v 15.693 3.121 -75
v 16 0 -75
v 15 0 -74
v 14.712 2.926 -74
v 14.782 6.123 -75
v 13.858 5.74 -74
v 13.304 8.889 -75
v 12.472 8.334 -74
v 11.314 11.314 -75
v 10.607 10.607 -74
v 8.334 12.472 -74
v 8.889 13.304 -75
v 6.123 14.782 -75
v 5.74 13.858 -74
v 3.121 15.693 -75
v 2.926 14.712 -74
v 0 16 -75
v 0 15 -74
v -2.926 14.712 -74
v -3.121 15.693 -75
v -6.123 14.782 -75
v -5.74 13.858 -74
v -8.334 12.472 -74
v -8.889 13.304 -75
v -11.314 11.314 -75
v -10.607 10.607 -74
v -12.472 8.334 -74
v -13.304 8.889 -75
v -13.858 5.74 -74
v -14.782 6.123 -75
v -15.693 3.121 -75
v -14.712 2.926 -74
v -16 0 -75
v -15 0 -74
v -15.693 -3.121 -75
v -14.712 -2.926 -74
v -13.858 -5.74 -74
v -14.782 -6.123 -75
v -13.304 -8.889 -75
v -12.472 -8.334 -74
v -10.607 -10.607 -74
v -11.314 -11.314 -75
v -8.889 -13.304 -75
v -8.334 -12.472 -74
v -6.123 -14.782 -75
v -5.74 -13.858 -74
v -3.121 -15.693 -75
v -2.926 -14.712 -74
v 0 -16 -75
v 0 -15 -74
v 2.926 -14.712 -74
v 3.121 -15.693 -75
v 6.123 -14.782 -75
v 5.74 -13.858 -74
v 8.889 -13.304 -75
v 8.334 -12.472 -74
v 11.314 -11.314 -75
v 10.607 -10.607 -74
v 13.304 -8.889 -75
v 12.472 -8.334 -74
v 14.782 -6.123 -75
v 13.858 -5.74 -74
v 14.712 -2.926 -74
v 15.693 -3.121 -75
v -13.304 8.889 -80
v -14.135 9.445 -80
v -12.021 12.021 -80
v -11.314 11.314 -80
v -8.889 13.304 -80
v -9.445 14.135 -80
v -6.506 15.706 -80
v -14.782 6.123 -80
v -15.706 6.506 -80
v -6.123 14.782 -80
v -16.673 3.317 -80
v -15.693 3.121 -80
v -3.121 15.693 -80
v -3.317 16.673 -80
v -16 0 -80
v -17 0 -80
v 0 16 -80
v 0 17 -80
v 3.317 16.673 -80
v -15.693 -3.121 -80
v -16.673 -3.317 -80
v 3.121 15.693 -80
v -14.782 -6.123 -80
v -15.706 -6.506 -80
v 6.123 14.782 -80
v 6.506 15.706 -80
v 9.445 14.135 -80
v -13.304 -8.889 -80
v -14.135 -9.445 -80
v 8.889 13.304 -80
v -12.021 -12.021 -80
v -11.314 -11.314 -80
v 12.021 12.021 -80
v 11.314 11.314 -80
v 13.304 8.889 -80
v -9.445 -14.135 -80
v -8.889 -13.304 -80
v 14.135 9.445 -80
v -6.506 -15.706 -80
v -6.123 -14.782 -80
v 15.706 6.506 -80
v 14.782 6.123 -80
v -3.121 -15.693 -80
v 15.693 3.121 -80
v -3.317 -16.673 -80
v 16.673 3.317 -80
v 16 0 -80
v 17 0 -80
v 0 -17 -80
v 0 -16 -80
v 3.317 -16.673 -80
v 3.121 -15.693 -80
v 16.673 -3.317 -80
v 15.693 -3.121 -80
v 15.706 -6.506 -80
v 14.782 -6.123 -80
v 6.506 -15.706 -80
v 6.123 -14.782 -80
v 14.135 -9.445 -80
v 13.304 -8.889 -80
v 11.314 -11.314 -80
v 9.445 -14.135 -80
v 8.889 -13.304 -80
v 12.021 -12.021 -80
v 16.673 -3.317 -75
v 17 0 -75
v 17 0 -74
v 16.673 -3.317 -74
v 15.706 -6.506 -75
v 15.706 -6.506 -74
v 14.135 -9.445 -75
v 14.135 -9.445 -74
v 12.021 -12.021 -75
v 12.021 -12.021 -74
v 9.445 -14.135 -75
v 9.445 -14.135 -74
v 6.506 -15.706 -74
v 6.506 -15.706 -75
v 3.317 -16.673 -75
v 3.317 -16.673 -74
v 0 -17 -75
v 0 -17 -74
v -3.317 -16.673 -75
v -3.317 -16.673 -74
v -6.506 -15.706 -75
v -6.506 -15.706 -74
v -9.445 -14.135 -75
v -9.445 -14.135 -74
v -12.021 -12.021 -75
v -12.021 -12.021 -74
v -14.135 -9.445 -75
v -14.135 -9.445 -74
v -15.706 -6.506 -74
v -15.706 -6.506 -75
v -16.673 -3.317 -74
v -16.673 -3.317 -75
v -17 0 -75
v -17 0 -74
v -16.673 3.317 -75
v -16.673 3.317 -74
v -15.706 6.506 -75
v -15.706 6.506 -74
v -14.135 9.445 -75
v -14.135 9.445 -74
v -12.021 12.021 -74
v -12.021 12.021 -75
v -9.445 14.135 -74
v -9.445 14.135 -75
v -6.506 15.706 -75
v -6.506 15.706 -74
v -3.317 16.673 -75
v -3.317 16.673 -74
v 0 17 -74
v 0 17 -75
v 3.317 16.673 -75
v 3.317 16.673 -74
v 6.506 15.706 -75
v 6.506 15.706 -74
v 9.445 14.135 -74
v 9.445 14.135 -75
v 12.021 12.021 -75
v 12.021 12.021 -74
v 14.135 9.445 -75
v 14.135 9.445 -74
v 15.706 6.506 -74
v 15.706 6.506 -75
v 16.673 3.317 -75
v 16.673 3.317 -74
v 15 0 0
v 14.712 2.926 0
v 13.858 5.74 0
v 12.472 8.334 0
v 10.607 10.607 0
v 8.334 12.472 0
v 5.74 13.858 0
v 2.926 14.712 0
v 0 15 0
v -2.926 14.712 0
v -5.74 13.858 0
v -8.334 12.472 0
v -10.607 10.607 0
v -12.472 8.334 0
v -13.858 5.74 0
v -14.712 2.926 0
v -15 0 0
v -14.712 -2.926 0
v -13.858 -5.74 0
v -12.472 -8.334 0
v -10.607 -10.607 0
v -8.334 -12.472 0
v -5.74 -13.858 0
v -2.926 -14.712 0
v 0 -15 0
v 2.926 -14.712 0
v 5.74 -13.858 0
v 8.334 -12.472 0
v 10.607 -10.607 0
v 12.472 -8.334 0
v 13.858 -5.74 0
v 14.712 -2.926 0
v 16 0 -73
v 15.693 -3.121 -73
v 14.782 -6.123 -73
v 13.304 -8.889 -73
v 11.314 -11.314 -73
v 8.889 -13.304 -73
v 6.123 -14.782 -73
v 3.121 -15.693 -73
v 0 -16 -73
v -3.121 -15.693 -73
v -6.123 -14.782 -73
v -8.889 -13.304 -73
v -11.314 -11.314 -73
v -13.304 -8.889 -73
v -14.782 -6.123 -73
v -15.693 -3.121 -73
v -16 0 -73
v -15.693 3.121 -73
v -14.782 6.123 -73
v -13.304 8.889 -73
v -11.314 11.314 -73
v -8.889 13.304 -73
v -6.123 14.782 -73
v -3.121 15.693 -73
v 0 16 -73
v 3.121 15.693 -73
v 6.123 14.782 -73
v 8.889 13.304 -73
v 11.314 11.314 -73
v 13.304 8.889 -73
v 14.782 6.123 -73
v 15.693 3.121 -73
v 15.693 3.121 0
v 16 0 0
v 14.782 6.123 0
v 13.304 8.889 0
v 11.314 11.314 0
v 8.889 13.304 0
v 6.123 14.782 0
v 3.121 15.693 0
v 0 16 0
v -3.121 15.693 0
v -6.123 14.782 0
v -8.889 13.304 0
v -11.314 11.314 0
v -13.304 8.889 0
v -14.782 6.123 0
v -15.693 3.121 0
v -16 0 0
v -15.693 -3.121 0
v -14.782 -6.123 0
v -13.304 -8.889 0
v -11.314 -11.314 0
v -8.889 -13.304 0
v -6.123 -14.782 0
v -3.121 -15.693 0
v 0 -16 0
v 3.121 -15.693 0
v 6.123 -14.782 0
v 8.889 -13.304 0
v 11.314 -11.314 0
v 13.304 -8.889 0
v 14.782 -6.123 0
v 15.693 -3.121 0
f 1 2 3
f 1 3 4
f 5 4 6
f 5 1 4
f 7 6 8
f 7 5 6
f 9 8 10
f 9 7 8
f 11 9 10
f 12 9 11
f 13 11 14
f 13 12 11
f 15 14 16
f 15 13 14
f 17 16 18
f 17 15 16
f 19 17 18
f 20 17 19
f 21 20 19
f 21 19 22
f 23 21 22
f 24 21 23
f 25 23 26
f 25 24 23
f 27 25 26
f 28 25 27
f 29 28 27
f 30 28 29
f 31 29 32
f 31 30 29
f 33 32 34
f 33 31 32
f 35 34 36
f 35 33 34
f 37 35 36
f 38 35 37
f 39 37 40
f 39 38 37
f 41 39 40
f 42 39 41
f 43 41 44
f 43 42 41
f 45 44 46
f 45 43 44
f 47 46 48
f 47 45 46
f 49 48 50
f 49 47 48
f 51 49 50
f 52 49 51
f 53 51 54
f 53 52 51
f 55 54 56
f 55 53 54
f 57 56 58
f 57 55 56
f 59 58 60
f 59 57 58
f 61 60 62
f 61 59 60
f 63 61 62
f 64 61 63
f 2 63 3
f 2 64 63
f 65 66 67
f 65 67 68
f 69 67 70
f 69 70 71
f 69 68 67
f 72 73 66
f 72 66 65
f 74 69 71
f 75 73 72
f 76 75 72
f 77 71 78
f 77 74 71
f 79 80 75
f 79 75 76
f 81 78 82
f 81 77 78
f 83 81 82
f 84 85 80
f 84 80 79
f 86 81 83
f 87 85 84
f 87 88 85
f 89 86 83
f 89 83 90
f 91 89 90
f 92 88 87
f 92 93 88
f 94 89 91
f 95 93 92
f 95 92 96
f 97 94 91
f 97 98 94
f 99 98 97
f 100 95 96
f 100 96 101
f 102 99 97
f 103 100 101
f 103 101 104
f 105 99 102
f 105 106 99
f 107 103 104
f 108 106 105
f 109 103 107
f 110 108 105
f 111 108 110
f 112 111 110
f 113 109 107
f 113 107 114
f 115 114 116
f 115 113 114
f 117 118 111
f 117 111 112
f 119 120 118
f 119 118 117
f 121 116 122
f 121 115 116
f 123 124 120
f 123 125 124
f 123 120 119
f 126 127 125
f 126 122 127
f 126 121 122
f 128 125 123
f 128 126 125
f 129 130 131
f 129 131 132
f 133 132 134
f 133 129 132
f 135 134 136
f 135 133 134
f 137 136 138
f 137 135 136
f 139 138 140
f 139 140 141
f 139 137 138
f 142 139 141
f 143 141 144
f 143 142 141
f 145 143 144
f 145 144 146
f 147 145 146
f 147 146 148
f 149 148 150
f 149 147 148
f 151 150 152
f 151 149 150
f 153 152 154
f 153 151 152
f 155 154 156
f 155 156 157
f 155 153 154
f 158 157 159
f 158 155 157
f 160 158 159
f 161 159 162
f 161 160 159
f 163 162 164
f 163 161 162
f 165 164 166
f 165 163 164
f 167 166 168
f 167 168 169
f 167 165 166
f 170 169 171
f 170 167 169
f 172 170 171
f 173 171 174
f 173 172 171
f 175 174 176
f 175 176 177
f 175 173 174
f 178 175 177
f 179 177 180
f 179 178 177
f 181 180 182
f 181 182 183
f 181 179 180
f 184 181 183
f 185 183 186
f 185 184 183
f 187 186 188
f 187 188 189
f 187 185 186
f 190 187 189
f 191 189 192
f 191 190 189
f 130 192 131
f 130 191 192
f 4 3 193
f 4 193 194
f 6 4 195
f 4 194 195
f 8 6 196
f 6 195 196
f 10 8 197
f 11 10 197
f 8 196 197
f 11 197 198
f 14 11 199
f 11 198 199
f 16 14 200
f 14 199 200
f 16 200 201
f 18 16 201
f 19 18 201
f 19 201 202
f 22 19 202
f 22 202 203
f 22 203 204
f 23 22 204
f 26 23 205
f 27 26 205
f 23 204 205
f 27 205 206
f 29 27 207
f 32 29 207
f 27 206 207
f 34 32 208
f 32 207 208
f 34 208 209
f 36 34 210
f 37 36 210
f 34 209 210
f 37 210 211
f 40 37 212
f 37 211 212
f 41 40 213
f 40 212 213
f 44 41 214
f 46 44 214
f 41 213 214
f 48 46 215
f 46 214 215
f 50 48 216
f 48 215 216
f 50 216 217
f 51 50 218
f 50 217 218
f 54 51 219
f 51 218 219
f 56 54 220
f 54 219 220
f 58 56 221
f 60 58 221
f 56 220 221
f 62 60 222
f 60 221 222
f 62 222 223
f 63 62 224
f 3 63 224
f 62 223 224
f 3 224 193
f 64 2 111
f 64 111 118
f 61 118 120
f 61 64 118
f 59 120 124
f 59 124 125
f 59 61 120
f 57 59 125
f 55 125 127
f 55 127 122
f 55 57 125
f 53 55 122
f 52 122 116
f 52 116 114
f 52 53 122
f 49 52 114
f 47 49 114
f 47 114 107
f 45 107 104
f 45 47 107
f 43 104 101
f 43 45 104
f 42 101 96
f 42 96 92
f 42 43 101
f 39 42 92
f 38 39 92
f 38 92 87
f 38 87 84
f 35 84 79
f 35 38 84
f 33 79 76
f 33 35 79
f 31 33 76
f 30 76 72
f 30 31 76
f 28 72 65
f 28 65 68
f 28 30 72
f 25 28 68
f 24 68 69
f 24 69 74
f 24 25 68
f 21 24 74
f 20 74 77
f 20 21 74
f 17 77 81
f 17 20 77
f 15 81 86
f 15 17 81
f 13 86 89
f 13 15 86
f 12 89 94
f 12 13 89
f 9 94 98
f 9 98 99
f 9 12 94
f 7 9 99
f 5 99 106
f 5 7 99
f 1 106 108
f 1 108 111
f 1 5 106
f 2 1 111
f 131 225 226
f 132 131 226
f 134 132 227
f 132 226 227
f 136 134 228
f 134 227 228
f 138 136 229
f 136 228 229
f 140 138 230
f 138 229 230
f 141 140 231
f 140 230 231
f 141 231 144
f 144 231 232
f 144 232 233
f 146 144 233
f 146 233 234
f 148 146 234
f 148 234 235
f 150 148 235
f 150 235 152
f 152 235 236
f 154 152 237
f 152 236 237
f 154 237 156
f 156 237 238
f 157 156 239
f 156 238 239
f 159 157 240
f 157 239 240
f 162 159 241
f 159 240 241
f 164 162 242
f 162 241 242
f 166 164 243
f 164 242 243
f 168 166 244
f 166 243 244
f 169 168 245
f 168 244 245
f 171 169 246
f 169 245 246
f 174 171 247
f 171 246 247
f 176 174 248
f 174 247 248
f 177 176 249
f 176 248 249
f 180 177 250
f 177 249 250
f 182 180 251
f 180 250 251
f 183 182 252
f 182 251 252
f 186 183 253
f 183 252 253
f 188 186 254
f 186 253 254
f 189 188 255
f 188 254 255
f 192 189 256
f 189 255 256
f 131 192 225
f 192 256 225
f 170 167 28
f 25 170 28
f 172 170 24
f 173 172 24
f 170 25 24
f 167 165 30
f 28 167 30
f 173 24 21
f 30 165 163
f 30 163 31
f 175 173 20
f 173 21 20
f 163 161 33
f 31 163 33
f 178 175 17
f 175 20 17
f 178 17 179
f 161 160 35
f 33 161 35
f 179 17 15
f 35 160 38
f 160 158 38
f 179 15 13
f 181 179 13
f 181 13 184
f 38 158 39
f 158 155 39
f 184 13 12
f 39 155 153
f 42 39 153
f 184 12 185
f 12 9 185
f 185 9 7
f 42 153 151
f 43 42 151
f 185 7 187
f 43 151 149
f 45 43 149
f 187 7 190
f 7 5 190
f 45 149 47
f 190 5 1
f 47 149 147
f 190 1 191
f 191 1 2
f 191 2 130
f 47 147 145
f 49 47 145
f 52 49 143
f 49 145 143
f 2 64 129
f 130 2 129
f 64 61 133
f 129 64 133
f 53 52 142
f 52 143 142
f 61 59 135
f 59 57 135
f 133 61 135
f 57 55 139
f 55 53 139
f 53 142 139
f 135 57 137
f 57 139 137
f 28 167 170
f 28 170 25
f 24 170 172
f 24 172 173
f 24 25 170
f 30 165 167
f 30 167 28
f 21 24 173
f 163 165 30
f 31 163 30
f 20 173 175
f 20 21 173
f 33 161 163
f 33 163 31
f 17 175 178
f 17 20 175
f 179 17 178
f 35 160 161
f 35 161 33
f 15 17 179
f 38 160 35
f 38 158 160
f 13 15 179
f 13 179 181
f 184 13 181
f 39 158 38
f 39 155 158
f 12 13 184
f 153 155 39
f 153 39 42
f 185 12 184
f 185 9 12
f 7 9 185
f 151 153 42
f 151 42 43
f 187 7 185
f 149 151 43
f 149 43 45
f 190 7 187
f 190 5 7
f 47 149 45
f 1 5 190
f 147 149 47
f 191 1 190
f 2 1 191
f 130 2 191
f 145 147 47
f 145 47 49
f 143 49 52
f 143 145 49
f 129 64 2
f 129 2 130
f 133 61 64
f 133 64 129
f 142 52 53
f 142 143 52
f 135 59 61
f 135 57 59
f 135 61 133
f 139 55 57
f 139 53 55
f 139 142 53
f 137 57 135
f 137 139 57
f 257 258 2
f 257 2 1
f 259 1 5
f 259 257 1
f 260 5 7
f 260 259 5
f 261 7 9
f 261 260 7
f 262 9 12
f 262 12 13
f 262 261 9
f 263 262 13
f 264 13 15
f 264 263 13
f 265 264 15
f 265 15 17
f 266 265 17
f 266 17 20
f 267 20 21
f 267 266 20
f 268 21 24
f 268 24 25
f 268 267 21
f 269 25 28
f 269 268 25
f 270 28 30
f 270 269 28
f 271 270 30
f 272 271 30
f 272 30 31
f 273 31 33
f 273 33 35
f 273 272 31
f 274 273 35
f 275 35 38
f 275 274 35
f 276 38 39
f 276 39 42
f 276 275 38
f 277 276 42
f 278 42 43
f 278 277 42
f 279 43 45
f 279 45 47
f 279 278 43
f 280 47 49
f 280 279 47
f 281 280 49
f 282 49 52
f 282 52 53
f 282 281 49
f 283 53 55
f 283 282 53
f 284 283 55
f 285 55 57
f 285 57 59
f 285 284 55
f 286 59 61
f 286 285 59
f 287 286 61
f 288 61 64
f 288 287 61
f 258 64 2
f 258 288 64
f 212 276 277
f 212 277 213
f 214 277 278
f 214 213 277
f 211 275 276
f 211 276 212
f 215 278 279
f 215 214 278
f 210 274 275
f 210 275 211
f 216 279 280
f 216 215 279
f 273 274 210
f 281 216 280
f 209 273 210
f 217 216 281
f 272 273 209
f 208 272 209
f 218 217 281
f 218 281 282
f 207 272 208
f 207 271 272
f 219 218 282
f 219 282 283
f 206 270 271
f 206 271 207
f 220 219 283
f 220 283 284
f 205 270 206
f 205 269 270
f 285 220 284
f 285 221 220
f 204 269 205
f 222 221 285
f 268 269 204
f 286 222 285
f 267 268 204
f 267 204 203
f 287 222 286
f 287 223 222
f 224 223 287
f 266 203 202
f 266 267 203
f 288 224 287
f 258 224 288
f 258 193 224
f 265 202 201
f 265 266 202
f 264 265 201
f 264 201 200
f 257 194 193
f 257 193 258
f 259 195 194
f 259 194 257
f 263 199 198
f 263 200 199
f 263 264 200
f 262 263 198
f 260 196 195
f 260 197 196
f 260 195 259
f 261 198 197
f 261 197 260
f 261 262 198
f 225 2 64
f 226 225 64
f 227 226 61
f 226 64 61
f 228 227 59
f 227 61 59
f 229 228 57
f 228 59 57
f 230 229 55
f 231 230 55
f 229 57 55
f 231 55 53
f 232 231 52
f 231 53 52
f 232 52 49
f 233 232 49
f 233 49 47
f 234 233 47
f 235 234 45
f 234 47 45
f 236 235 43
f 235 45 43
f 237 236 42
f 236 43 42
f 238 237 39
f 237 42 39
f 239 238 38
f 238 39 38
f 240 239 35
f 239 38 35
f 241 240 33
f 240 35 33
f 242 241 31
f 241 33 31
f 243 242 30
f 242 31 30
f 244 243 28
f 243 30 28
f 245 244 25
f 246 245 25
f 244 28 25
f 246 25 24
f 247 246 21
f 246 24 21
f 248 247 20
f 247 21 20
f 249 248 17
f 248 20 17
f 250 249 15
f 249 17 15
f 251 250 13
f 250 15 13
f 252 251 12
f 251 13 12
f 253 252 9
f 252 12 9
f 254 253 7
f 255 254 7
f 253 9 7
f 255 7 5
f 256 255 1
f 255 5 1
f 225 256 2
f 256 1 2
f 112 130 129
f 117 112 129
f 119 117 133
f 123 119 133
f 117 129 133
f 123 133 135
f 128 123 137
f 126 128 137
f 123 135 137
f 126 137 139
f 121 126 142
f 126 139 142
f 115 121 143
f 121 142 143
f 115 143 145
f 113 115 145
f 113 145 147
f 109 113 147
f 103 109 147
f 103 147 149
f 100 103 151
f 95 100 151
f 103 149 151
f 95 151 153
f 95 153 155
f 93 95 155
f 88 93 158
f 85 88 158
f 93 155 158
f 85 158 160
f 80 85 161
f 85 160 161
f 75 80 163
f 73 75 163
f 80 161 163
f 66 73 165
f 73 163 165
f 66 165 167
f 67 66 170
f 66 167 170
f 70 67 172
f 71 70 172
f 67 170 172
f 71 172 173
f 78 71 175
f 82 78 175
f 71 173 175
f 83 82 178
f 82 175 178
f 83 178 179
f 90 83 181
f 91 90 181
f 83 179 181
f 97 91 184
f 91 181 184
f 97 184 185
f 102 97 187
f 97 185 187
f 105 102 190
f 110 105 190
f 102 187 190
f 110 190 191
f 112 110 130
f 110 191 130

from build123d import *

# Parameters (mm, degrees)
F0_R     = 16
F0_R_2   = 15
F1_DEPTH = 75
F2_R     = 17
F2_R_2   = 16
F3_DEPTH = 5
F4_DEPTH = 2
F5_SIZE  = 0.99999
F6_SIZE  = 0.99999


# Not quite as in the source:
# - a fillet or chamfer is up to 0.001 mm smaller than in the source, because OpenCascade refuses the exact size


with BuildPart() as f1:
    # F0 (on Top) → F1 (new body)
    with BuildSketch(Plane.XY):
        Circle(F0_R)
        Circle(F0_R_2, mode=Mode.SUBTRACT)
    extrude(amount=-F1_DEPTH)

    # F5 (size 1 in the source; OpenCascade refuses exactly that, so slightly less here)
    f5_edges = [f1.edges().sort_by_distance(p)[0] for p in [
        (-15, 0, -75),
    ]]
    chamfer(f5_edges, length=F5_SIZE)


with BuildPart() as f3:
    # F2 (on face) → F3 (new body)
    with BuildSketch(Plane(origin=(0, 0, -75), x_dir=(1, 0, 0), z_dir=(0, 0, -1))):
        Circle(F2_R)
        Circle(F2_R_2, mode=Mode.SUBTRACT)
    extrude(amount=F3_DEPTH)


with BuildPart() as f4:
    # F4 (new): a face of the model
    f4_faces = [f3.part.faces().sort_by_distance(p)[0] for p in [
        (-16.5191673888, 0, -75),
    ]]
    extrude(f4_faces, amount=F4_DEPTH)

    # F6 (size 1 in the source; OpenCascade refuses exactly that, so slightly less here)
    f6_edges = [f4.edges().sort_by_distance(p)[0] for p in [
        (-17, 0, -73),
    ]]
    chamfer(f6_edges, length=F6_SIZE)


solid = Compound([f1.part, f3.part, f4.part])
